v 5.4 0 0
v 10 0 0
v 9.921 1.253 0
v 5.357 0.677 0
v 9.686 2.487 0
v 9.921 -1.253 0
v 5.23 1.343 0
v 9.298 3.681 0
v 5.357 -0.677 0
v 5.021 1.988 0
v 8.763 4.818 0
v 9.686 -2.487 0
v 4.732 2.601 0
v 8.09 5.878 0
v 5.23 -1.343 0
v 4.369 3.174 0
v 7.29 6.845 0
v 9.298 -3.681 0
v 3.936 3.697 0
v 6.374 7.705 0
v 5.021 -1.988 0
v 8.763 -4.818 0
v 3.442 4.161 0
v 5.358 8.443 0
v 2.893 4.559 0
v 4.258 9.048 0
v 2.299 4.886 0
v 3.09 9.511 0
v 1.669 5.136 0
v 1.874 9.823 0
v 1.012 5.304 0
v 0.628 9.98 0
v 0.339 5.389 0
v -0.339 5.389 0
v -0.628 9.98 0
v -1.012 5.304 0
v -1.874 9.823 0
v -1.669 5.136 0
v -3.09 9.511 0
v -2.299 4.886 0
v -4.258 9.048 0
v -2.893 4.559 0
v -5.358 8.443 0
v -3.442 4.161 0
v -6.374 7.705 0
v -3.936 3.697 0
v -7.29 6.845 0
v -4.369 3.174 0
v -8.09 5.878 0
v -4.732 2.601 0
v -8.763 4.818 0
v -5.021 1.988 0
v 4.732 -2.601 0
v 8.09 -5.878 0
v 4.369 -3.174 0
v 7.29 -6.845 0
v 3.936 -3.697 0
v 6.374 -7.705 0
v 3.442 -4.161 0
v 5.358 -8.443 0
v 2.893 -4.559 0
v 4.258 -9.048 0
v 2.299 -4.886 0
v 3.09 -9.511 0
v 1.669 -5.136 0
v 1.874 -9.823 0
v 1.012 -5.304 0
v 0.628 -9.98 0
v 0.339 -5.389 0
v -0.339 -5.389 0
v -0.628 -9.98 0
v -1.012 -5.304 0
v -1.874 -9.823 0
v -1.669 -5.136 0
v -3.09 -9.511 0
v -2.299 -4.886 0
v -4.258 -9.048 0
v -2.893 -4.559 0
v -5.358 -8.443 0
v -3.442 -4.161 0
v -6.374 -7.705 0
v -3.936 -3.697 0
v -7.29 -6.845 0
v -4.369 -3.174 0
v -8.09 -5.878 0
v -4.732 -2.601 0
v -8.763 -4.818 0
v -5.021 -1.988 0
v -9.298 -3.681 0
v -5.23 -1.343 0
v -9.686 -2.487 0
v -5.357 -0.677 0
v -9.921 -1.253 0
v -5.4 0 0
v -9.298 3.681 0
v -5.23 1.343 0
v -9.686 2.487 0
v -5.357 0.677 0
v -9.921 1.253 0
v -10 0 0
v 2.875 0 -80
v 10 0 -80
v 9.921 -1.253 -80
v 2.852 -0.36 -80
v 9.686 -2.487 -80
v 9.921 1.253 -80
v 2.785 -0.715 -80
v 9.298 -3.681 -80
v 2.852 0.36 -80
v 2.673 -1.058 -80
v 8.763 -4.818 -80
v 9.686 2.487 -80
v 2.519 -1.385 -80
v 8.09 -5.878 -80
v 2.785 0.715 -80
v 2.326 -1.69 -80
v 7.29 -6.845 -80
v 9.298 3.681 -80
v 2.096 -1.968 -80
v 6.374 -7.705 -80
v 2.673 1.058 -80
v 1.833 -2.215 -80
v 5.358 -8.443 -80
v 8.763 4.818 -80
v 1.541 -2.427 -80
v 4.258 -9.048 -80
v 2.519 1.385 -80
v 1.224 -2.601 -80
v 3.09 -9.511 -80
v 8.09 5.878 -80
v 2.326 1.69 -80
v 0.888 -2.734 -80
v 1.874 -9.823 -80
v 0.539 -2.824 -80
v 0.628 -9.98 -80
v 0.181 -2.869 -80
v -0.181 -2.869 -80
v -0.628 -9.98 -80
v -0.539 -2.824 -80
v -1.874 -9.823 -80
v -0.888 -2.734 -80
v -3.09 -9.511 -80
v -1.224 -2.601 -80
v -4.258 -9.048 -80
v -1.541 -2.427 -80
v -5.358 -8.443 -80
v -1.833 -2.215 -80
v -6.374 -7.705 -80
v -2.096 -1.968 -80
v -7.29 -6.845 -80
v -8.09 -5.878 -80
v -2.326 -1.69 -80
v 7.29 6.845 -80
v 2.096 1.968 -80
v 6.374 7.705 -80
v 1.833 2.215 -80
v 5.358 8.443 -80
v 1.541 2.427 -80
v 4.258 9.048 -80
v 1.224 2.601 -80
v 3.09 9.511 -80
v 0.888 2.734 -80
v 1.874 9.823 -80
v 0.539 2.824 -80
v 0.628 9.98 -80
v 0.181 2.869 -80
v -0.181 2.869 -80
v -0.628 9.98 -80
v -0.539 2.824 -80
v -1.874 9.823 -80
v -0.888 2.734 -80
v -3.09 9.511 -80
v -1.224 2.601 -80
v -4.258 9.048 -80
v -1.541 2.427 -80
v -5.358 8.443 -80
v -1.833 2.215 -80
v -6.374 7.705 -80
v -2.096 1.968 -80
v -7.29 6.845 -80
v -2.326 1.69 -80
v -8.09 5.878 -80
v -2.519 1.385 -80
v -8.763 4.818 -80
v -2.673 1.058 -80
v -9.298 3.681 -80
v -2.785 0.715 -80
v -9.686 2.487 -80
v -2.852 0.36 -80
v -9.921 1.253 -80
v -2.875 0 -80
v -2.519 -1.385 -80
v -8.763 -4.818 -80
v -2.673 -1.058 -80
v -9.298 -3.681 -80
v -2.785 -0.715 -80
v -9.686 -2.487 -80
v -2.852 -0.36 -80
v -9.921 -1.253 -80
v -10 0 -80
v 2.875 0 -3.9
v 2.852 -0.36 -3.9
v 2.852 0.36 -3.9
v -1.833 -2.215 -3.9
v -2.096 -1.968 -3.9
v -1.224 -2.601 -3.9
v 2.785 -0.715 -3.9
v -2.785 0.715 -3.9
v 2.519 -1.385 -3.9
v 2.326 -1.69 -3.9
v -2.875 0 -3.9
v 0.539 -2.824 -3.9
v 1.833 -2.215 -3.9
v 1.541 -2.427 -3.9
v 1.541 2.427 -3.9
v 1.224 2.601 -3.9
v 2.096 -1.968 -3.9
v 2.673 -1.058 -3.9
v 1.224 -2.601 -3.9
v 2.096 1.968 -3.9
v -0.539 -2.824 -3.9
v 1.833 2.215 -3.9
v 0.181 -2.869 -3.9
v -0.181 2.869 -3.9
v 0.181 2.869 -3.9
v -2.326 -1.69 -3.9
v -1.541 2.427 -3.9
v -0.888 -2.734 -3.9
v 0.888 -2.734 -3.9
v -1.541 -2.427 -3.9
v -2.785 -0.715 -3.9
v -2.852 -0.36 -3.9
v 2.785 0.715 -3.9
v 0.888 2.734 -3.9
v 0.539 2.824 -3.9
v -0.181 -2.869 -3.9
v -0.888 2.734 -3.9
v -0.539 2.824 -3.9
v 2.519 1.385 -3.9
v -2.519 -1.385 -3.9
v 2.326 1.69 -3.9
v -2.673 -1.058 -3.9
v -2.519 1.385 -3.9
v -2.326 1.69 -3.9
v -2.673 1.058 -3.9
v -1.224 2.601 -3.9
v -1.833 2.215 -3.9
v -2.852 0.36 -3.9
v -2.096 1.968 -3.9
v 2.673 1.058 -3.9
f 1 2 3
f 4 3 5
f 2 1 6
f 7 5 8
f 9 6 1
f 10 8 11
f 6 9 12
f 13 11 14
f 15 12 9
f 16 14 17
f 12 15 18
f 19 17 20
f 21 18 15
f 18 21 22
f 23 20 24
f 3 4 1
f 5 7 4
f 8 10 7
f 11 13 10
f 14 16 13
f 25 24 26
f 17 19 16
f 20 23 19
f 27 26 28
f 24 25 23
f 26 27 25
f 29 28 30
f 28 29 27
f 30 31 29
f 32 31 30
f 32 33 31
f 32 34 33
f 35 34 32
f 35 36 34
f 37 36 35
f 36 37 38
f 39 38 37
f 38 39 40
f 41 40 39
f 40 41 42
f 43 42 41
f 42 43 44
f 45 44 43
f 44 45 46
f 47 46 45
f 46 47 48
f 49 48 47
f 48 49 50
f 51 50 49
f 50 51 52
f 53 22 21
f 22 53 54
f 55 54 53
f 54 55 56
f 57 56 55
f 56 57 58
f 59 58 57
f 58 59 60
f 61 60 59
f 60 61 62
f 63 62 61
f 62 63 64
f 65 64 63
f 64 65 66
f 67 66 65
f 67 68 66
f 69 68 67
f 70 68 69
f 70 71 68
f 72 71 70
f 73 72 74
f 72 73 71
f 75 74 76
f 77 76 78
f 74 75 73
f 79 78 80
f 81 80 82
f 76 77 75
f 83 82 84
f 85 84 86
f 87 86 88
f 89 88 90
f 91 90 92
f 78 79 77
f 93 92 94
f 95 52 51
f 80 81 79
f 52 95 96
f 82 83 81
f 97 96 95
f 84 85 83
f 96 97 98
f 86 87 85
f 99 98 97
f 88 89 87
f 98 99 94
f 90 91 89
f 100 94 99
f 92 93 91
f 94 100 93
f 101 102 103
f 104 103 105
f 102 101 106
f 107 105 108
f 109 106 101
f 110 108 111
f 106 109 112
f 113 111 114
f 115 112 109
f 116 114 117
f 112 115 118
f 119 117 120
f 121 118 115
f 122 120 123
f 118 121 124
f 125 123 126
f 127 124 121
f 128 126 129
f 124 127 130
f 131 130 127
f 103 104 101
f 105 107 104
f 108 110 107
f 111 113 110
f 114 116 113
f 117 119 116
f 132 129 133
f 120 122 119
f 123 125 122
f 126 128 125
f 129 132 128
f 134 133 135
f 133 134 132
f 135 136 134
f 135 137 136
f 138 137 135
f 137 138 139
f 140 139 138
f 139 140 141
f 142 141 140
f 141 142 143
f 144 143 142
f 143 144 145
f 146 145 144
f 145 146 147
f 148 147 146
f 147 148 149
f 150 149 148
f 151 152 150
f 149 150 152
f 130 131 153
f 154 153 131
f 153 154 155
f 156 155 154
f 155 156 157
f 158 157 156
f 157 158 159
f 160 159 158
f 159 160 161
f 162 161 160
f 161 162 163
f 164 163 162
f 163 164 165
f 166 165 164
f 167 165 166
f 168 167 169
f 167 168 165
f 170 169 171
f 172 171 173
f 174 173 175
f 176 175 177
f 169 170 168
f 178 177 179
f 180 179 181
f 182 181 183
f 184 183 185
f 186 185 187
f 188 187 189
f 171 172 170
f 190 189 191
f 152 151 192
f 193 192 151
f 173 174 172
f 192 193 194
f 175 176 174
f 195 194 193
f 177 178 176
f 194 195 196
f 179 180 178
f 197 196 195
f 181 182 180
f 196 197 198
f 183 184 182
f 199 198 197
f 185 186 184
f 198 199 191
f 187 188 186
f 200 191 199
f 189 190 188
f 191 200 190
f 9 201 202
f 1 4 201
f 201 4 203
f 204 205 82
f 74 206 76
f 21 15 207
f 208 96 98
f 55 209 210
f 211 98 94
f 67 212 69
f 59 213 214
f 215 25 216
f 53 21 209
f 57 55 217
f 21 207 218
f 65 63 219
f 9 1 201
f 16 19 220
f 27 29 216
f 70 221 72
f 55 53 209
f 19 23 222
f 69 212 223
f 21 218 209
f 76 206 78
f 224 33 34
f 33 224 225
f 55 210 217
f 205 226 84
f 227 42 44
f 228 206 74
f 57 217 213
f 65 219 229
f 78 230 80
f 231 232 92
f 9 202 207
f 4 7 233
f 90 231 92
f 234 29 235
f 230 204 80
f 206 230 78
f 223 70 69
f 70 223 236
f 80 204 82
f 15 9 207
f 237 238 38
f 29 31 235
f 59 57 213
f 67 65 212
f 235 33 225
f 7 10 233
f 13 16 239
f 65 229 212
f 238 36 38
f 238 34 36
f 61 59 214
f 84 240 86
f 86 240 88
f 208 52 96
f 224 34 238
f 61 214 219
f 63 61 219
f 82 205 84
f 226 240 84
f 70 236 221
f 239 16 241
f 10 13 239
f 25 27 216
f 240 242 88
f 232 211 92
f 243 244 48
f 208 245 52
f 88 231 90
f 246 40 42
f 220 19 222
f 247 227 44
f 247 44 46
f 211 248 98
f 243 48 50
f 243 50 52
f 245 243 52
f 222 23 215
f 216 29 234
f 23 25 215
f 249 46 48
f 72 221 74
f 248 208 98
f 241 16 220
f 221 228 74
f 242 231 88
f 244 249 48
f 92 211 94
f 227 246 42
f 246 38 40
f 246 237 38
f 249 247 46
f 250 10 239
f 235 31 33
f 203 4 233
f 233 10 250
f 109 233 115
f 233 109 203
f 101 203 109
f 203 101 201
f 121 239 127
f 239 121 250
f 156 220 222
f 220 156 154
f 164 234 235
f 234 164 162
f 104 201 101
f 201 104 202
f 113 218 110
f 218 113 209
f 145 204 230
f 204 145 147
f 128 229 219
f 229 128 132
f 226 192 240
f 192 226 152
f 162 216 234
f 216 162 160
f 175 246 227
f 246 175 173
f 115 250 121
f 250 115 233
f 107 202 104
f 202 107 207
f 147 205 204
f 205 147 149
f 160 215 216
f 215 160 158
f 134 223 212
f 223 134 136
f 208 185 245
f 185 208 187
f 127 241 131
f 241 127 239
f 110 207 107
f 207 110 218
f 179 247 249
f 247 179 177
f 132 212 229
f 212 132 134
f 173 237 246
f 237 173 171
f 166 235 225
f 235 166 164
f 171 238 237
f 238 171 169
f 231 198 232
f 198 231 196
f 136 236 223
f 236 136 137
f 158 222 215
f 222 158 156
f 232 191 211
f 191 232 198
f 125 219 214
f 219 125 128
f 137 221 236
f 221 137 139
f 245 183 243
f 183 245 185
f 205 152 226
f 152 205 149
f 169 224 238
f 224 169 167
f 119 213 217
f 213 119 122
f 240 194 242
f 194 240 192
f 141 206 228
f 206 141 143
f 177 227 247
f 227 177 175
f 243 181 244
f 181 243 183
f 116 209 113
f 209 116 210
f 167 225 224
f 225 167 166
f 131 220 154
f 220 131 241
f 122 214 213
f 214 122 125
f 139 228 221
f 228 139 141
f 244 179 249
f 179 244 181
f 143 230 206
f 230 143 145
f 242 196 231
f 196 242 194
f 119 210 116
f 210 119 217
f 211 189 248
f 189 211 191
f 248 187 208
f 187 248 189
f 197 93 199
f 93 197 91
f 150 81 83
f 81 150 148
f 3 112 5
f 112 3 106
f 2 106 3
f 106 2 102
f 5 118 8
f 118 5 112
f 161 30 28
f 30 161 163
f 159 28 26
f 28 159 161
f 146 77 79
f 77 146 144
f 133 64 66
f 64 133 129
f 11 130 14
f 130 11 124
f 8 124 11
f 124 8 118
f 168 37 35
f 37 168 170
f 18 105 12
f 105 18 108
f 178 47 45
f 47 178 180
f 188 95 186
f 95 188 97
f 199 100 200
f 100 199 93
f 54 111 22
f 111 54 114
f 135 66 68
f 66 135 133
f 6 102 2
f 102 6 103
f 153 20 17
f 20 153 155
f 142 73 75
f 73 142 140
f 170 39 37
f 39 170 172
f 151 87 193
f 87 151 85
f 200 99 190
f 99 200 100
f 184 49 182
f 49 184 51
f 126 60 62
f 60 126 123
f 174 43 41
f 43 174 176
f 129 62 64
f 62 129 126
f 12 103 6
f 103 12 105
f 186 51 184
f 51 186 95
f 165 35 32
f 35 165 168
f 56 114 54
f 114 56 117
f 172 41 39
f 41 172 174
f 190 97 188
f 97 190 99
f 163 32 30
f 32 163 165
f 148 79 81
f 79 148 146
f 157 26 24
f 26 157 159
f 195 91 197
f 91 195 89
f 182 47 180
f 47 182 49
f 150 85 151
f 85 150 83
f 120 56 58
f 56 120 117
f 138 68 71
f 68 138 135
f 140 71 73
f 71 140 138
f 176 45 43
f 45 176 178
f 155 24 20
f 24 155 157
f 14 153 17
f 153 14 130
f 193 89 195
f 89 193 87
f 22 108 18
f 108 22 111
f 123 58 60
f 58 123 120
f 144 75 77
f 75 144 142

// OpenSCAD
$fn = 50;


difference() {
	union() {
		translate(v = [0, 0, -80.0000000000]) {
			cylinder(h = 80, r = 10.0000000000);
		}
		cylinder(h = 0, r = 13.0000000000);
	}
	union() {
		translate(v = [0, 0, 0]) {
			rotate(a = [0, 0, 0]) {
				difference() {
					union() {
						#translate(v = [0, 0, -80.0000000000]) {
							cylinder(h = 80, r = 2.6000000000);
						}
						#translate(v = [0, 0, -3.9000000000]) {
							cylinder(h = 3.9000000000, r1 = 2.8750000000, r2 = 5.4000000000);
						}
						#translate(v = [0, 0, -80.0000000000]) {
							cylinder(h = 80, r = 2.8750000000);
						}
						#translate(v = [0, 0, -80.0000000000]) {
							cylinder(h = 80, r = 2.6000000000);
						}
					}
					union();
				}
			}
		}
	}
}
